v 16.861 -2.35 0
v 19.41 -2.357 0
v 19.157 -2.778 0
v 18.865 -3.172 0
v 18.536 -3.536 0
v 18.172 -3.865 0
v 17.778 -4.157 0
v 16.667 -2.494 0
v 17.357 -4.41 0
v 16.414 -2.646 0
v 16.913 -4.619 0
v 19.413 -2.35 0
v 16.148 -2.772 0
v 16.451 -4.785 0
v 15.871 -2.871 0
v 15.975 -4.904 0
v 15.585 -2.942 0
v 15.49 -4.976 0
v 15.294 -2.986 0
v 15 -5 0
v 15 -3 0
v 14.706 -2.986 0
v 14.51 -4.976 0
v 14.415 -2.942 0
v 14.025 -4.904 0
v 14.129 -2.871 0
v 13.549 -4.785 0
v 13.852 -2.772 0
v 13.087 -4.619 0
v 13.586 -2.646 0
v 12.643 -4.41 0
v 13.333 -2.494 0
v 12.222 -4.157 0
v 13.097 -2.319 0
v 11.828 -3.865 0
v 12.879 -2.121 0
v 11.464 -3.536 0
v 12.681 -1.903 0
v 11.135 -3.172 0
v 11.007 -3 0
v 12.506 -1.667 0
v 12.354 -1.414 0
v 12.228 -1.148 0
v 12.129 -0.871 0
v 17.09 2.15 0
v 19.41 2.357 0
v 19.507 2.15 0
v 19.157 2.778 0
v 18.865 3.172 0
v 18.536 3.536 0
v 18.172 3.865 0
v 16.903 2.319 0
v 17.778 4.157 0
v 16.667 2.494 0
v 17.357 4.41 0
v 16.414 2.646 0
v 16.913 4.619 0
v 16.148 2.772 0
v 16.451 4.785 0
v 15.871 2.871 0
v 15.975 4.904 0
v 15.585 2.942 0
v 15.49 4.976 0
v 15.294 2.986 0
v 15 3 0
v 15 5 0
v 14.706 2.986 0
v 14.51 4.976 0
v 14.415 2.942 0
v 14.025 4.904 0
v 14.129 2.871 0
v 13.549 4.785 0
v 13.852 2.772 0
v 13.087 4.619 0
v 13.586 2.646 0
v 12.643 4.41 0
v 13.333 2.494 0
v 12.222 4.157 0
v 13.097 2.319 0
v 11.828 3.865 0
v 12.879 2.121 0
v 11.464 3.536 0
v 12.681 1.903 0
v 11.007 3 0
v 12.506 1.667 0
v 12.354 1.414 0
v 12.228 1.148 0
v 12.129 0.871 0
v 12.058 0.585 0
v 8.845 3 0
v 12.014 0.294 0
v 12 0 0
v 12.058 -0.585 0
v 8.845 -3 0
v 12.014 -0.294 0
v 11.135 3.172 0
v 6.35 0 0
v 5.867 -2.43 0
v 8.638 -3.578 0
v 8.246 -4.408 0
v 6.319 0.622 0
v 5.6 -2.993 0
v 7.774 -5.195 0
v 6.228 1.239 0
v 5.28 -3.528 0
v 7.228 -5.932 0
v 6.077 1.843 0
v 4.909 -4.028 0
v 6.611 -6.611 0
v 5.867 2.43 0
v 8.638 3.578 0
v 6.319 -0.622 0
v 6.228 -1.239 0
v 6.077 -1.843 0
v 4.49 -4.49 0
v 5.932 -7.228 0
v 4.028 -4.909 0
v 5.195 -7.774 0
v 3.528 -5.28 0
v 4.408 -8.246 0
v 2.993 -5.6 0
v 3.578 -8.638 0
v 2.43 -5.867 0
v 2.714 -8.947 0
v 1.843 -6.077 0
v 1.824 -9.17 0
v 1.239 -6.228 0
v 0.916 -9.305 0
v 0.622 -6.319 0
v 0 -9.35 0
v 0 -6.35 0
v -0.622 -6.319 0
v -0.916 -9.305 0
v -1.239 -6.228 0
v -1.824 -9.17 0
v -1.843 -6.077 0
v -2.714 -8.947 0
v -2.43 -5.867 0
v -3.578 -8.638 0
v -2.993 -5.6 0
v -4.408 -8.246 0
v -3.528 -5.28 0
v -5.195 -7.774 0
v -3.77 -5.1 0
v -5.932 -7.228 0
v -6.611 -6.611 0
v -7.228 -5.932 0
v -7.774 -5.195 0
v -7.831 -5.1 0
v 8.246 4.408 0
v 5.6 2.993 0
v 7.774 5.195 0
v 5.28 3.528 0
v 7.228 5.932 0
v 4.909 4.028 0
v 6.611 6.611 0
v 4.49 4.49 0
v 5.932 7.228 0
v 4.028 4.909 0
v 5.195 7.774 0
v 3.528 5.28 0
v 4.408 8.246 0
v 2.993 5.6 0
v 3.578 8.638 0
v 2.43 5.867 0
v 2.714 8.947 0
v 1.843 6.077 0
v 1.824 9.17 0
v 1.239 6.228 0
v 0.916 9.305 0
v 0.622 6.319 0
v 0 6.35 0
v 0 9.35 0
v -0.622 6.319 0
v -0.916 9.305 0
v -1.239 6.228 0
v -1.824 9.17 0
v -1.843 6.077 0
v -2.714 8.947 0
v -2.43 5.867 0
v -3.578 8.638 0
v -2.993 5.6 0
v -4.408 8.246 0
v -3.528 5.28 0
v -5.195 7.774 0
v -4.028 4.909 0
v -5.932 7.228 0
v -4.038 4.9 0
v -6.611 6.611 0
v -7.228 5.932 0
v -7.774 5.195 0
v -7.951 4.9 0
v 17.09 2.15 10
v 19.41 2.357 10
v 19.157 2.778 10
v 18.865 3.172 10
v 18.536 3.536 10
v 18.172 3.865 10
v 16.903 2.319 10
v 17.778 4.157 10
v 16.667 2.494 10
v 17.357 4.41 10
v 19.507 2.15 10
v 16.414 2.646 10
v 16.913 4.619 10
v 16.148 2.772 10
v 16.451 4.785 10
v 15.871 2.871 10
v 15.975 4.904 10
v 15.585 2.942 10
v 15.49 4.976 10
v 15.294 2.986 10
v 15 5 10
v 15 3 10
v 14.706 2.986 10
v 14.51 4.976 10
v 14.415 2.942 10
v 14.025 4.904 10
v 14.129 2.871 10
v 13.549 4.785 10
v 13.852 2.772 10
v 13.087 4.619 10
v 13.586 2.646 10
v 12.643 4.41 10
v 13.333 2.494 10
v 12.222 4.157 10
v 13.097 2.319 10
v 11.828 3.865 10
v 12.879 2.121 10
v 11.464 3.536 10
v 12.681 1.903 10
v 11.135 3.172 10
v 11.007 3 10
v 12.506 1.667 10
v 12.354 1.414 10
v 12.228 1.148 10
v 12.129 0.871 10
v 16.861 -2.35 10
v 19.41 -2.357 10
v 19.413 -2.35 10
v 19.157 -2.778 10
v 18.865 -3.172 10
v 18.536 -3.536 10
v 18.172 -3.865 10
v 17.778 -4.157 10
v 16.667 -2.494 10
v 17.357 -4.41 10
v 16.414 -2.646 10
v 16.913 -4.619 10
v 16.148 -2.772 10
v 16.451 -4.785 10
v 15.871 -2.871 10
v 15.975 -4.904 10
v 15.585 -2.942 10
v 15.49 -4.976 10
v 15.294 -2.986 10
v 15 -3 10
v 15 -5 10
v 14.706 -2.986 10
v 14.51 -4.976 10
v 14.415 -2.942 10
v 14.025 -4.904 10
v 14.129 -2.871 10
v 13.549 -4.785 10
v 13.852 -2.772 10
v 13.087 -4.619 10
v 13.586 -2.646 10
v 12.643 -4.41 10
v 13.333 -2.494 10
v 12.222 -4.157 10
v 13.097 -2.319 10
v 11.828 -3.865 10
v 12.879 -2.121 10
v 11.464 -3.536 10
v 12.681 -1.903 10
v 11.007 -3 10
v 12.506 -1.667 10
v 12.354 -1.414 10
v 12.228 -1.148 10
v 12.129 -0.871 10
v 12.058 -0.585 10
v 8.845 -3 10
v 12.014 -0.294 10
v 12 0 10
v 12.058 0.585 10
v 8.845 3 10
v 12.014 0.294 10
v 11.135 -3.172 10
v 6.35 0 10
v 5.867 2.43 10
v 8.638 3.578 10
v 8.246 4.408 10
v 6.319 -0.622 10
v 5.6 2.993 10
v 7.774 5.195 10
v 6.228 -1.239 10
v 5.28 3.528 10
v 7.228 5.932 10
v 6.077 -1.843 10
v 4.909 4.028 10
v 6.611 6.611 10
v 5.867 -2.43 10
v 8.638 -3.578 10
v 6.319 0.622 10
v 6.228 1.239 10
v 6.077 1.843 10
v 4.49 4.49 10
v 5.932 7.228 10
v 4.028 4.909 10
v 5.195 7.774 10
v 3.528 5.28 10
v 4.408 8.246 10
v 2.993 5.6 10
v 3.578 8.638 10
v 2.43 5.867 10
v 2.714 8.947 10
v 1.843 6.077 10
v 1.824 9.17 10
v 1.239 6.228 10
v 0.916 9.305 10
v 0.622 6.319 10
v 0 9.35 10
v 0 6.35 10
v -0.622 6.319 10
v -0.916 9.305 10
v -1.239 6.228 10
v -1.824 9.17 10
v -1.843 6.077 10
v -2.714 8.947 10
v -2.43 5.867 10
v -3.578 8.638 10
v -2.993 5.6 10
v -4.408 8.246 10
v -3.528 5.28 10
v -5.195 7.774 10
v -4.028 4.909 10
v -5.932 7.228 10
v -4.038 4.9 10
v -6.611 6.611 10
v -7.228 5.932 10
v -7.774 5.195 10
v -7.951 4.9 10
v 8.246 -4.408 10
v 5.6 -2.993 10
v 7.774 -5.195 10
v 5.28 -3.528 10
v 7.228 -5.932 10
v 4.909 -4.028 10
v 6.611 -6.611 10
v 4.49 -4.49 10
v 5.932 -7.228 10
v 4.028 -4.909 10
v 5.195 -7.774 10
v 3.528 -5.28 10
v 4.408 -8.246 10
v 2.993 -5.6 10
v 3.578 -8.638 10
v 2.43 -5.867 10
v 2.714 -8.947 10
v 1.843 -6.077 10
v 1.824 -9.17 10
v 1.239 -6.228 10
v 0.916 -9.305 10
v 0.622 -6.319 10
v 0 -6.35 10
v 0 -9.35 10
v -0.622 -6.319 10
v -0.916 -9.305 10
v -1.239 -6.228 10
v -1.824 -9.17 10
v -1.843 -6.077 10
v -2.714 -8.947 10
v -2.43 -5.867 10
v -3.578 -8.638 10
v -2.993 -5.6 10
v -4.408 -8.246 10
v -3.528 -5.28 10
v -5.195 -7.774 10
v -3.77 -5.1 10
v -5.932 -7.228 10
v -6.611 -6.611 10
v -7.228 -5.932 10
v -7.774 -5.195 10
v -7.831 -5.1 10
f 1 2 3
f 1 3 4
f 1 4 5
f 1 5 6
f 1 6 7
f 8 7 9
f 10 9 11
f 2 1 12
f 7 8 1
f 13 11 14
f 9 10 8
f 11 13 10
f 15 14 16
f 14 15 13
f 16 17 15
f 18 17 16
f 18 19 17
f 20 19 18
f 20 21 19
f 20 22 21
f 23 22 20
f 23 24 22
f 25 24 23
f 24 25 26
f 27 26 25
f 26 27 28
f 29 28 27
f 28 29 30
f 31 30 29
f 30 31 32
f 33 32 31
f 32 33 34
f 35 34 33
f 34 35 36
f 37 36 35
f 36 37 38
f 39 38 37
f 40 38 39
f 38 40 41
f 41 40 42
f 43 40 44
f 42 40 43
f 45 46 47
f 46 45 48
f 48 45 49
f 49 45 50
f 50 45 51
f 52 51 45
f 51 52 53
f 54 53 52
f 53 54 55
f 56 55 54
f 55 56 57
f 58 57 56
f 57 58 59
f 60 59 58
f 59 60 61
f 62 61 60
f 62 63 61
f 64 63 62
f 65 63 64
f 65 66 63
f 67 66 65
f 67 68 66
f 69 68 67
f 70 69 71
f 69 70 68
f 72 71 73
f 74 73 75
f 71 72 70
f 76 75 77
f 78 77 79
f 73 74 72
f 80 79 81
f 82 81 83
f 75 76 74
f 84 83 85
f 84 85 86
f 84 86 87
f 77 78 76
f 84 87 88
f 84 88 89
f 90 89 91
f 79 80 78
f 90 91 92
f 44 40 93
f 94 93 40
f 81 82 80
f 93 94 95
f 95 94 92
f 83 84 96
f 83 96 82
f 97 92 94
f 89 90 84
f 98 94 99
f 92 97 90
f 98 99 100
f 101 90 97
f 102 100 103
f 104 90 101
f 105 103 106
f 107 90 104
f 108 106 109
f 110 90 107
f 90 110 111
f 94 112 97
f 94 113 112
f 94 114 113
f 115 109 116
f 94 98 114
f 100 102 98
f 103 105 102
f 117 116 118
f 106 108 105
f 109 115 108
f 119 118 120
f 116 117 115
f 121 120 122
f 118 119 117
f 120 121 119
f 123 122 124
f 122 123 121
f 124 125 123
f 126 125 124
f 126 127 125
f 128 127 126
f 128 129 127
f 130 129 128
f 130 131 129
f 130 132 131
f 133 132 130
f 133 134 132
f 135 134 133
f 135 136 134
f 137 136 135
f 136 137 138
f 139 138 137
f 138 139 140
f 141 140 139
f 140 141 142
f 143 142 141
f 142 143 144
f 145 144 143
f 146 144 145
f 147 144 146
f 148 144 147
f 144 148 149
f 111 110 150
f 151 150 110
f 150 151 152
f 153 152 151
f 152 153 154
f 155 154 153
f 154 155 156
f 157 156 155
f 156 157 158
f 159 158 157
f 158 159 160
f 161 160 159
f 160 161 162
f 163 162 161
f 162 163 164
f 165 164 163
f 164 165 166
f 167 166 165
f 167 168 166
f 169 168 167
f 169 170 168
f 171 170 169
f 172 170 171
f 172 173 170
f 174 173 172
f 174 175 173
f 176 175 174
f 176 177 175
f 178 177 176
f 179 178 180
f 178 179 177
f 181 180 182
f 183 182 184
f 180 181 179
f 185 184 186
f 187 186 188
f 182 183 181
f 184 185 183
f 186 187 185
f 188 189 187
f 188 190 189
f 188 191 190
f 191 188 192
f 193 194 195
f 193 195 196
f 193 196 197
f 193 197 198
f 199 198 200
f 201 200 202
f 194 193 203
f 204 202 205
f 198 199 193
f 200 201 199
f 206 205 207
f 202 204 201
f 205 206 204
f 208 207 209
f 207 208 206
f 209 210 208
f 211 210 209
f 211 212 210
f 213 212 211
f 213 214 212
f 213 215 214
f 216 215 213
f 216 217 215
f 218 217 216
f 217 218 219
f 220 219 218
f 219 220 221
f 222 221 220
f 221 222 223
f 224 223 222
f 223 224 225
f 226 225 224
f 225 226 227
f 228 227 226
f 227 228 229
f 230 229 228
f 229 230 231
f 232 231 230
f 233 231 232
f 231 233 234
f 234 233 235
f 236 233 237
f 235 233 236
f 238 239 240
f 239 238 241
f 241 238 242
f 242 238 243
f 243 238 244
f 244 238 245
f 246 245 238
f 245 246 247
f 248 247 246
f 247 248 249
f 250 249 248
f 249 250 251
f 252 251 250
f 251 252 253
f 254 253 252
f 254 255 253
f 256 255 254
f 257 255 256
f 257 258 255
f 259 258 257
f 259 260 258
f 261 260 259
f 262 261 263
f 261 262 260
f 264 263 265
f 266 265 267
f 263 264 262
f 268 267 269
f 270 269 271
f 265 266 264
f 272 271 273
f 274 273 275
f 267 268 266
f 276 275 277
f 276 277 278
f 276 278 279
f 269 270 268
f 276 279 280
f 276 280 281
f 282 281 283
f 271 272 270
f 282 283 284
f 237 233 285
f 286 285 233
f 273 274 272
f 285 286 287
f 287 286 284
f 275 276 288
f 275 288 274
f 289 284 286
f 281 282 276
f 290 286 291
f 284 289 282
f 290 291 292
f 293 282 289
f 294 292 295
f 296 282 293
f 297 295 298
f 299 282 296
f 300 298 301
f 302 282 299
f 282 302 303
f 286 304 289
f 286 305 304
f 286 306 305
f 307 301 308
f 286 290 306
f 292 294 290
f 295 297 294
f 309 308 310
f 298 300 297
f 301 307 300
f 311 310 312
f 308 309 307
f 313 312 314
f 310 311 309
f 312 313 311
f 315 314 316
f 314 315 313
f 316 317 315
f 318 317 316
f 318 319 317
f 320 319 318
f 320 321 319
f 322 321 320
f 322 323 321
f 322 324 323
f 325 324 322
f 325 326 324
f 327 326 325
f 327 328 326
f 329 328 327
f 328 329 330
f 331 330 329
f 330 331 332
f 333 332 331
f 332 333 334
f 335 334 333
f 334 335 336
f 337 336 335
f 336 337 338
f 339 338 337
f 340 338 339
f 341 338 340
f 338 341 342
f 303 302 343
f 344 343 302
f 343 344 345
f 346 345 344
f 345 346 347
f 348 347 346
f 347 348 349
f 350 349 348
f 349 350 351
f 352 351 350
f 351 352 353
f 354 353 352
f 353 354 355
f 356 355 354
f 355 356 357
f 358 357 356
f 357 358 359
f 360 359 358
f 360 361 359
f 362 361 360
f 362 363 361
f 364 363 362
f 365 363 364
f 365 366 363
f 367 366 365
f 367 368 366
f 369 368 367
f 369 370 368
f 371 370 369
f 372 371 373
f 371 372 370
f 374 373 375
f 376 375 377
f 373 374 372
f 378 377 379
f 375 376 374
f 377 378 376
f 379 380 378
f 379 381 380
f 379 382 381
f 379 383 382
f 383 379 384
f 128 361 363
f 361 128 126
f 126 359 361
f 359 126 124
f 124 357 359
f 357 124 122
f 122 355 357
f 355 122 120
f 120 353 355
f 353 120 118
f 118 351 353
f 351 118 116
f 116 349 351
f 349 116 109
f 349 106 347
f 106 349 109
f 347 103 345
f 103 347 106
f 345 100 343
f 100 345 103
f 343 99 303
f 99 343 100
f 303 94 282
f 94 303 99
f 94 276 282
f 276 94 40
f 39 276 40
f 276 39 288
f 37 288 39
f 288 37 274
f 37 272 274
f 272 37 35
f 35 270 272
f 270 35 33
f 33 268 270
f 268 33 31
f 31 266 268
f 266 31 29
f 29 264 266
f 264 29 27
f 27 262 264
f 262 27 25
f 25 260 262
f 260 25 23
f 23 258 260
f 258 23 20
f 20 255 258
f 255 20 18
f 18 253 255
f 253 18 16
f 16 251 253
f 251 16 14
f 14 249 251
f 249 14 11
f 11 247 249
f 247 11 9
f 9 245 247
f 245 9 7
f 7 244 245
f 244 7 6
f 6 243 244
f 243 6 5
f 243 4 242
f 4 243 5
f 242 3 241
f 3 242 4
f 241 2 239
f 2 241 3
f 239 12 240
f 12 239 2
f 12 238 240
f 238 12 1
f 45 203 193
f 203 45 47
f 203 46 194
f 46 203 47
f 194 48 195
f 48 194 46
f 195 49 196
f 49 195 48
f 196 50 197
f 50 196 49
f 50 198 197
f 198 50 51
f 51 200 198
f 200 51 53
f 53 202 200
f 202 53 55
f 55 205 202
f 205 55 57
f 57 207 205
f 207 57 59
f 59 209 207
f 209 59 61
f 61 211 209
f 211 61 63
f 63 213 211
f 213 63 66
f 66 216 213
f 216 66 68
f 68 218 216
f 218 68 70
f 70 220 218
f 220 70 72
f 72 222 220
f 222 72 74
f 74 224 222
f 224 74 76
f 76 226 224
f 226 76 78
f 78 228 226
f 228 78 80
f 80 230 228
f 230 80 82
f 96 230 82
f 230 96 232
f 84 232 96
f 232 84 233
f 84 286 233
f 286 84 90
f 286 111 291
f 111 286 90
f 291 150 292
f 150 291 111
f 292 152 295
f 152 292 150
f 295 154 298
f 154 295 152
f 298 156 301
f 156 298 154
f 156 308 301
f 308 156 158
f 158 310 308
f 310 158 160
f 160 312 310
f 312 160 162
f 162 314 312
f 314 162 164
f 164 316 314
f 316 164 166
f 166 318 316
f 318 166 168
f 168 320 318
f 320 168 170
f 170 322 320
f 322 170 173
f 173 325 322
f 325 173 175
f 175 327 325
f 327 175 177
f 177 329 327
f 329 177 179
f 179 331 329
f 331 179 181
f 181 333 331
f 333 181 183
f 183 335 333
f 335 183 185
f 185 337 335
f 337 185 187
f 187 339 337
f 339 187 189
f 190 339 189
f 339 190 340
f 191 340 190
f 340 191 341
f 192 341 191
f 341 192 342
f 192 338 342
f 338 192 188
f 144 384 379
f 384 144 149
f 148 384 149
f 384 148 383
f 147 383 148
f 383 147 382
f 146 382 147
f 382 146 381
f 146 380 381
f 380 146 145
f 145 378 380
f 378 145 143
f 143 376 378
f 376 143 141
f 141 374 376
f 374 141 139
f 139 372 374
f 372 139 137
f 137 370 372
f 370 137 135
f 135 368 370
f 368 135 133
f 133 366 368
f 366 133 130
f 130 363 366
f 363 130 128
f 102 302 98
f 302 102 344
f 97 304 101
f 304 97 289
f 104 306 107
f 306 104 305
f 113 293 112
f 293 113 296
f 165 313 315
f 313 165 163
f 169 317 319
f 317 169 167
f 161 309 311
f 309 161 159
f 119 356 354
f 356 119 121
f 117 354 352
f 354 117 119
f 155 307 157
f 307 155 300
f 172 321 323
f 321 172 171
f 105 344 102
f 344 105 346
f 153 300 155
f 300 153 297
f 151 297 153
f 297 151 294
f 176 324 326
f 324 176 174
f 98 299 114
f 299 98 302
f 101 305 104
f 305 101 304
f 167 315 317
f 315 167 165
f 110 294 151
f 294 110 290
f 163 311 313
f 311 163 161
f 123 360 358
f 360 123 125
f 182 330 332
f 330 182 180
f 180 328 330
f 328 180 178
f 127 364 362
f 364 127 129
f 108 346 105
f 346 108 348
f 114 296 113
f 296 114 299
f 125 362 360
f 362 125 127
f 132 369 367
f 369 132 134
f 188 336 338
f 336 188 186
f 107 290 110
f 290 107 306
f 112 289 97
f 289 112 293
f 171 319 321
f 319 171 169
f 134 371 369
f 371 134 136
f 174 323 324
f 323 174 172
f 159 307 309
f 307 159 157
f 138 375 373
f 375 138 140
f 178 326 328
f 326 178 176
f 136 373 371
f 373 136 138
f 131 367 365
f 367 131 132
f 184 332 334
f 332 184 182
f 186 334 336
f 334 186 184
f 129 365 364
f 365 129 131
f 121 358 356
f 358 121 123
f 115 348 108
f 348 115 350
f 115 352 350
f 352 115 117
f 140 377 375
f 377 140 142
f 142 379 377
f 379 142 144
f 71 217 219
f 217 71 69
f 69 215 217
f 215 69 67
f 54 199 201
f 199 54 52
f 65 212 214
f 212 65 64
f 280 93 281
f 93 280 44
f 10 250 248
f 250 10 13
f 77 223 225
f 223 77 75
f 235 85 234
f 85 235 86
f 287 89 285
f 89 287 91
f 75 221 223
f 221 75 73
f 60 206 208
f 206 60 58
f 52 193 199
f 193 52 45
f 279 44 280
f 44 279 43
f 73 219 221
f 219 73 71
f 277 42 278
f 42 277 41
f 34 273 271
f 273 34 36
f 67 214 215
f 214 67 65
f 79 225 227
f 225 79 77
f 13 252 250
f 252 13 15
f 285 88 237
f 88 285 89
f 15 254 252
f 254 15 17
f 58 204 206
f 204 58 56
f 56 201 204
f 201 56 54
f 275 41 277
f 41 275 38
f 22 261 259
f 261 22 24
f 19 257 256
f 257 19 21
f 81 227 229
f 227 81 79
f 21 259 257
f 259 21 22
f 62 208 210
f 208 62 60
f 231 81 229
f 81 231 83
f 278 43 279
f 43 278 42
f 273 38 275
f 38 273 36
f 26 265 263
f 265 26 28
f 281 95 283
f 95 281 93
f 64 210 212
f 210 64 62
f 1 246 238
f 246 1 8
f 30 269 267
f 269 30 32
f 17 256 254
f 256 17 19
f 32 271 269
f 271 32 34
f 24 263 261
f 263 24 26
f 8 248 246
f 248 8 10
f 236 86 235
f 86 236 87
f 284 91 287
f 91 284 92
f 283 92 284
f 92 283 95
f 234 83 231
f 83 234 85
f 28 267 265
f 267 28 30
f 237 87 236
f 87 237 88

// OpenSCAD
// Snap-on clip for 12.7mm rod and 6mm tubing
// Designed for FDM printing: printed flat on the XY plane.

// --- Dimensions ---
rod_id       = 12.7;    // Inner diameter of the rod ring
rod_wall     = 3.0;     // Wall thickness of the rod ring
rod_od       = rod_id + 2 * rod_wall; // Outer diameter of the rod ring
rod_gap_w    = 10.0;    // Width of the gap in the rod ring
rod_gap_h    = 10.0;    // Height of the gap in the rod ring (total span)

tube_id      = 6.0;     // Inner diameter of the tubing ring
tube_wall    = 2.0;     // Wall thickness of the tubing ring
tube_od      = tube_id + 2 * tube_wall; // Outer diameter of the tubing ring
tube_gap_w   = 4.5;     // Width of the gap in the tubing ring
tube_gap_h   = 4.5;     // Height of the gap in the tubing ring (total span)

tube_offset_x = 15.0;   // X-coordinate of the tubing ring center
bridge_w_y    = 6.0;    // Width of the bridge in the Y direction
bridge_x_start = 8.0;   // Start of the bridge in X
bridge_x_end   = 12.0;  // End of the bridge in X

extrusion_z   = 10.0;   // Height of the part (Z)

$fn = 64;

// --- Geometry Construction ---

// 1. The Rod Ring Profile (2D)
// Centered at (0,0). We create a circle and subtract the gap.
module rod_ring_profile() {
    difference() {
        circle(d = rod_od);
        // The gap is on the -X side. 
        // Everything with x < 0 and -5 < y < 5 is removed.
        // We use a rectangle to define the cutout.
        // To ensure a clean cut, we make the rectangle slightly larger.
        translate([-rod_od, -rod_gap_h/2 - 0.1]) 
            square([rod_od + 1, rod_gap_h]);
    }
}

// 2. The Tubing Ring Profile (2D)
// Centered at (15, 0). Gap is on the +X side.
module tubing_ring_profile() {
    translate([tube_offset_x, 0]) {
        difference() {
            circle(d = tube_od);
            // The gap is on the +X side.
            // Everything with x > 15 and -2.25 < y < 2.25 is removed.
            // Relative to the center (15,0), this is x > 0 and -2.25 < y < 2.25.
            translate([0, -tube_gap_h/2 - 0.1]) 
                square([tube_od + 1, tube_gap_h]);
        }
    }
}

// 3. The Bridge Profile (2D)
// A solid rectangle between x=8 and x=12, with width 6mm in Y.
module bridge_profile() {
    translate([bridge_x_start, -bridge_w_y/2])
        square([bridge_x_end - bridge_x_start, bridge_w_y]);
}

// --- Final Assembly ---

// We union the 2D profiles and then extrude them to Z height.
// We use a difference to ensure the internal holes are actually holes.
// However, the prompt asks for a "solid bridge" and "rings".
// The most robust way is to union the ring outlines and the bridge, 
// then subtract the inner diameters.

difference() {
    // The outer boundary of the whole part
    linear_extrude(height = extrusion_z) {
        union() {
            // Rod ring outer boundary
            difference() {
                circle(d = rod_od);
                // Subtract the gap from the rod ring
                translate([-rod_od, -rod_gap_h/2 - 0.1]) 
                    square([rod_od + 1, rod_gap_h]);
            }
            
            // Tubing ring outer boundary
            translate([tube_offset_x, 0]) {
                difference() {
                    circle(d = tube_od);
                    // Subtract the gap from the tubing ring
                    translate([0, -tube_gap_h/2 - 0.1]) 
                        square([tube_od + 1, tube_gap_h]);
                }
            }
            
            // The bridge
            bridge_profile();
        }
    }

    // Subtract the inner holes to make them actual holes
    // Rod hole
    translate([0, 0, -0.1])
        cylinder(h = extrusion_z + 0.2, d = rod_id);
    
    // Tubing hole
    translate([tube_offset_x, 0, -0.1])
        cylinder(h = extrusion_z + 0.2, d = tube_id);
}
